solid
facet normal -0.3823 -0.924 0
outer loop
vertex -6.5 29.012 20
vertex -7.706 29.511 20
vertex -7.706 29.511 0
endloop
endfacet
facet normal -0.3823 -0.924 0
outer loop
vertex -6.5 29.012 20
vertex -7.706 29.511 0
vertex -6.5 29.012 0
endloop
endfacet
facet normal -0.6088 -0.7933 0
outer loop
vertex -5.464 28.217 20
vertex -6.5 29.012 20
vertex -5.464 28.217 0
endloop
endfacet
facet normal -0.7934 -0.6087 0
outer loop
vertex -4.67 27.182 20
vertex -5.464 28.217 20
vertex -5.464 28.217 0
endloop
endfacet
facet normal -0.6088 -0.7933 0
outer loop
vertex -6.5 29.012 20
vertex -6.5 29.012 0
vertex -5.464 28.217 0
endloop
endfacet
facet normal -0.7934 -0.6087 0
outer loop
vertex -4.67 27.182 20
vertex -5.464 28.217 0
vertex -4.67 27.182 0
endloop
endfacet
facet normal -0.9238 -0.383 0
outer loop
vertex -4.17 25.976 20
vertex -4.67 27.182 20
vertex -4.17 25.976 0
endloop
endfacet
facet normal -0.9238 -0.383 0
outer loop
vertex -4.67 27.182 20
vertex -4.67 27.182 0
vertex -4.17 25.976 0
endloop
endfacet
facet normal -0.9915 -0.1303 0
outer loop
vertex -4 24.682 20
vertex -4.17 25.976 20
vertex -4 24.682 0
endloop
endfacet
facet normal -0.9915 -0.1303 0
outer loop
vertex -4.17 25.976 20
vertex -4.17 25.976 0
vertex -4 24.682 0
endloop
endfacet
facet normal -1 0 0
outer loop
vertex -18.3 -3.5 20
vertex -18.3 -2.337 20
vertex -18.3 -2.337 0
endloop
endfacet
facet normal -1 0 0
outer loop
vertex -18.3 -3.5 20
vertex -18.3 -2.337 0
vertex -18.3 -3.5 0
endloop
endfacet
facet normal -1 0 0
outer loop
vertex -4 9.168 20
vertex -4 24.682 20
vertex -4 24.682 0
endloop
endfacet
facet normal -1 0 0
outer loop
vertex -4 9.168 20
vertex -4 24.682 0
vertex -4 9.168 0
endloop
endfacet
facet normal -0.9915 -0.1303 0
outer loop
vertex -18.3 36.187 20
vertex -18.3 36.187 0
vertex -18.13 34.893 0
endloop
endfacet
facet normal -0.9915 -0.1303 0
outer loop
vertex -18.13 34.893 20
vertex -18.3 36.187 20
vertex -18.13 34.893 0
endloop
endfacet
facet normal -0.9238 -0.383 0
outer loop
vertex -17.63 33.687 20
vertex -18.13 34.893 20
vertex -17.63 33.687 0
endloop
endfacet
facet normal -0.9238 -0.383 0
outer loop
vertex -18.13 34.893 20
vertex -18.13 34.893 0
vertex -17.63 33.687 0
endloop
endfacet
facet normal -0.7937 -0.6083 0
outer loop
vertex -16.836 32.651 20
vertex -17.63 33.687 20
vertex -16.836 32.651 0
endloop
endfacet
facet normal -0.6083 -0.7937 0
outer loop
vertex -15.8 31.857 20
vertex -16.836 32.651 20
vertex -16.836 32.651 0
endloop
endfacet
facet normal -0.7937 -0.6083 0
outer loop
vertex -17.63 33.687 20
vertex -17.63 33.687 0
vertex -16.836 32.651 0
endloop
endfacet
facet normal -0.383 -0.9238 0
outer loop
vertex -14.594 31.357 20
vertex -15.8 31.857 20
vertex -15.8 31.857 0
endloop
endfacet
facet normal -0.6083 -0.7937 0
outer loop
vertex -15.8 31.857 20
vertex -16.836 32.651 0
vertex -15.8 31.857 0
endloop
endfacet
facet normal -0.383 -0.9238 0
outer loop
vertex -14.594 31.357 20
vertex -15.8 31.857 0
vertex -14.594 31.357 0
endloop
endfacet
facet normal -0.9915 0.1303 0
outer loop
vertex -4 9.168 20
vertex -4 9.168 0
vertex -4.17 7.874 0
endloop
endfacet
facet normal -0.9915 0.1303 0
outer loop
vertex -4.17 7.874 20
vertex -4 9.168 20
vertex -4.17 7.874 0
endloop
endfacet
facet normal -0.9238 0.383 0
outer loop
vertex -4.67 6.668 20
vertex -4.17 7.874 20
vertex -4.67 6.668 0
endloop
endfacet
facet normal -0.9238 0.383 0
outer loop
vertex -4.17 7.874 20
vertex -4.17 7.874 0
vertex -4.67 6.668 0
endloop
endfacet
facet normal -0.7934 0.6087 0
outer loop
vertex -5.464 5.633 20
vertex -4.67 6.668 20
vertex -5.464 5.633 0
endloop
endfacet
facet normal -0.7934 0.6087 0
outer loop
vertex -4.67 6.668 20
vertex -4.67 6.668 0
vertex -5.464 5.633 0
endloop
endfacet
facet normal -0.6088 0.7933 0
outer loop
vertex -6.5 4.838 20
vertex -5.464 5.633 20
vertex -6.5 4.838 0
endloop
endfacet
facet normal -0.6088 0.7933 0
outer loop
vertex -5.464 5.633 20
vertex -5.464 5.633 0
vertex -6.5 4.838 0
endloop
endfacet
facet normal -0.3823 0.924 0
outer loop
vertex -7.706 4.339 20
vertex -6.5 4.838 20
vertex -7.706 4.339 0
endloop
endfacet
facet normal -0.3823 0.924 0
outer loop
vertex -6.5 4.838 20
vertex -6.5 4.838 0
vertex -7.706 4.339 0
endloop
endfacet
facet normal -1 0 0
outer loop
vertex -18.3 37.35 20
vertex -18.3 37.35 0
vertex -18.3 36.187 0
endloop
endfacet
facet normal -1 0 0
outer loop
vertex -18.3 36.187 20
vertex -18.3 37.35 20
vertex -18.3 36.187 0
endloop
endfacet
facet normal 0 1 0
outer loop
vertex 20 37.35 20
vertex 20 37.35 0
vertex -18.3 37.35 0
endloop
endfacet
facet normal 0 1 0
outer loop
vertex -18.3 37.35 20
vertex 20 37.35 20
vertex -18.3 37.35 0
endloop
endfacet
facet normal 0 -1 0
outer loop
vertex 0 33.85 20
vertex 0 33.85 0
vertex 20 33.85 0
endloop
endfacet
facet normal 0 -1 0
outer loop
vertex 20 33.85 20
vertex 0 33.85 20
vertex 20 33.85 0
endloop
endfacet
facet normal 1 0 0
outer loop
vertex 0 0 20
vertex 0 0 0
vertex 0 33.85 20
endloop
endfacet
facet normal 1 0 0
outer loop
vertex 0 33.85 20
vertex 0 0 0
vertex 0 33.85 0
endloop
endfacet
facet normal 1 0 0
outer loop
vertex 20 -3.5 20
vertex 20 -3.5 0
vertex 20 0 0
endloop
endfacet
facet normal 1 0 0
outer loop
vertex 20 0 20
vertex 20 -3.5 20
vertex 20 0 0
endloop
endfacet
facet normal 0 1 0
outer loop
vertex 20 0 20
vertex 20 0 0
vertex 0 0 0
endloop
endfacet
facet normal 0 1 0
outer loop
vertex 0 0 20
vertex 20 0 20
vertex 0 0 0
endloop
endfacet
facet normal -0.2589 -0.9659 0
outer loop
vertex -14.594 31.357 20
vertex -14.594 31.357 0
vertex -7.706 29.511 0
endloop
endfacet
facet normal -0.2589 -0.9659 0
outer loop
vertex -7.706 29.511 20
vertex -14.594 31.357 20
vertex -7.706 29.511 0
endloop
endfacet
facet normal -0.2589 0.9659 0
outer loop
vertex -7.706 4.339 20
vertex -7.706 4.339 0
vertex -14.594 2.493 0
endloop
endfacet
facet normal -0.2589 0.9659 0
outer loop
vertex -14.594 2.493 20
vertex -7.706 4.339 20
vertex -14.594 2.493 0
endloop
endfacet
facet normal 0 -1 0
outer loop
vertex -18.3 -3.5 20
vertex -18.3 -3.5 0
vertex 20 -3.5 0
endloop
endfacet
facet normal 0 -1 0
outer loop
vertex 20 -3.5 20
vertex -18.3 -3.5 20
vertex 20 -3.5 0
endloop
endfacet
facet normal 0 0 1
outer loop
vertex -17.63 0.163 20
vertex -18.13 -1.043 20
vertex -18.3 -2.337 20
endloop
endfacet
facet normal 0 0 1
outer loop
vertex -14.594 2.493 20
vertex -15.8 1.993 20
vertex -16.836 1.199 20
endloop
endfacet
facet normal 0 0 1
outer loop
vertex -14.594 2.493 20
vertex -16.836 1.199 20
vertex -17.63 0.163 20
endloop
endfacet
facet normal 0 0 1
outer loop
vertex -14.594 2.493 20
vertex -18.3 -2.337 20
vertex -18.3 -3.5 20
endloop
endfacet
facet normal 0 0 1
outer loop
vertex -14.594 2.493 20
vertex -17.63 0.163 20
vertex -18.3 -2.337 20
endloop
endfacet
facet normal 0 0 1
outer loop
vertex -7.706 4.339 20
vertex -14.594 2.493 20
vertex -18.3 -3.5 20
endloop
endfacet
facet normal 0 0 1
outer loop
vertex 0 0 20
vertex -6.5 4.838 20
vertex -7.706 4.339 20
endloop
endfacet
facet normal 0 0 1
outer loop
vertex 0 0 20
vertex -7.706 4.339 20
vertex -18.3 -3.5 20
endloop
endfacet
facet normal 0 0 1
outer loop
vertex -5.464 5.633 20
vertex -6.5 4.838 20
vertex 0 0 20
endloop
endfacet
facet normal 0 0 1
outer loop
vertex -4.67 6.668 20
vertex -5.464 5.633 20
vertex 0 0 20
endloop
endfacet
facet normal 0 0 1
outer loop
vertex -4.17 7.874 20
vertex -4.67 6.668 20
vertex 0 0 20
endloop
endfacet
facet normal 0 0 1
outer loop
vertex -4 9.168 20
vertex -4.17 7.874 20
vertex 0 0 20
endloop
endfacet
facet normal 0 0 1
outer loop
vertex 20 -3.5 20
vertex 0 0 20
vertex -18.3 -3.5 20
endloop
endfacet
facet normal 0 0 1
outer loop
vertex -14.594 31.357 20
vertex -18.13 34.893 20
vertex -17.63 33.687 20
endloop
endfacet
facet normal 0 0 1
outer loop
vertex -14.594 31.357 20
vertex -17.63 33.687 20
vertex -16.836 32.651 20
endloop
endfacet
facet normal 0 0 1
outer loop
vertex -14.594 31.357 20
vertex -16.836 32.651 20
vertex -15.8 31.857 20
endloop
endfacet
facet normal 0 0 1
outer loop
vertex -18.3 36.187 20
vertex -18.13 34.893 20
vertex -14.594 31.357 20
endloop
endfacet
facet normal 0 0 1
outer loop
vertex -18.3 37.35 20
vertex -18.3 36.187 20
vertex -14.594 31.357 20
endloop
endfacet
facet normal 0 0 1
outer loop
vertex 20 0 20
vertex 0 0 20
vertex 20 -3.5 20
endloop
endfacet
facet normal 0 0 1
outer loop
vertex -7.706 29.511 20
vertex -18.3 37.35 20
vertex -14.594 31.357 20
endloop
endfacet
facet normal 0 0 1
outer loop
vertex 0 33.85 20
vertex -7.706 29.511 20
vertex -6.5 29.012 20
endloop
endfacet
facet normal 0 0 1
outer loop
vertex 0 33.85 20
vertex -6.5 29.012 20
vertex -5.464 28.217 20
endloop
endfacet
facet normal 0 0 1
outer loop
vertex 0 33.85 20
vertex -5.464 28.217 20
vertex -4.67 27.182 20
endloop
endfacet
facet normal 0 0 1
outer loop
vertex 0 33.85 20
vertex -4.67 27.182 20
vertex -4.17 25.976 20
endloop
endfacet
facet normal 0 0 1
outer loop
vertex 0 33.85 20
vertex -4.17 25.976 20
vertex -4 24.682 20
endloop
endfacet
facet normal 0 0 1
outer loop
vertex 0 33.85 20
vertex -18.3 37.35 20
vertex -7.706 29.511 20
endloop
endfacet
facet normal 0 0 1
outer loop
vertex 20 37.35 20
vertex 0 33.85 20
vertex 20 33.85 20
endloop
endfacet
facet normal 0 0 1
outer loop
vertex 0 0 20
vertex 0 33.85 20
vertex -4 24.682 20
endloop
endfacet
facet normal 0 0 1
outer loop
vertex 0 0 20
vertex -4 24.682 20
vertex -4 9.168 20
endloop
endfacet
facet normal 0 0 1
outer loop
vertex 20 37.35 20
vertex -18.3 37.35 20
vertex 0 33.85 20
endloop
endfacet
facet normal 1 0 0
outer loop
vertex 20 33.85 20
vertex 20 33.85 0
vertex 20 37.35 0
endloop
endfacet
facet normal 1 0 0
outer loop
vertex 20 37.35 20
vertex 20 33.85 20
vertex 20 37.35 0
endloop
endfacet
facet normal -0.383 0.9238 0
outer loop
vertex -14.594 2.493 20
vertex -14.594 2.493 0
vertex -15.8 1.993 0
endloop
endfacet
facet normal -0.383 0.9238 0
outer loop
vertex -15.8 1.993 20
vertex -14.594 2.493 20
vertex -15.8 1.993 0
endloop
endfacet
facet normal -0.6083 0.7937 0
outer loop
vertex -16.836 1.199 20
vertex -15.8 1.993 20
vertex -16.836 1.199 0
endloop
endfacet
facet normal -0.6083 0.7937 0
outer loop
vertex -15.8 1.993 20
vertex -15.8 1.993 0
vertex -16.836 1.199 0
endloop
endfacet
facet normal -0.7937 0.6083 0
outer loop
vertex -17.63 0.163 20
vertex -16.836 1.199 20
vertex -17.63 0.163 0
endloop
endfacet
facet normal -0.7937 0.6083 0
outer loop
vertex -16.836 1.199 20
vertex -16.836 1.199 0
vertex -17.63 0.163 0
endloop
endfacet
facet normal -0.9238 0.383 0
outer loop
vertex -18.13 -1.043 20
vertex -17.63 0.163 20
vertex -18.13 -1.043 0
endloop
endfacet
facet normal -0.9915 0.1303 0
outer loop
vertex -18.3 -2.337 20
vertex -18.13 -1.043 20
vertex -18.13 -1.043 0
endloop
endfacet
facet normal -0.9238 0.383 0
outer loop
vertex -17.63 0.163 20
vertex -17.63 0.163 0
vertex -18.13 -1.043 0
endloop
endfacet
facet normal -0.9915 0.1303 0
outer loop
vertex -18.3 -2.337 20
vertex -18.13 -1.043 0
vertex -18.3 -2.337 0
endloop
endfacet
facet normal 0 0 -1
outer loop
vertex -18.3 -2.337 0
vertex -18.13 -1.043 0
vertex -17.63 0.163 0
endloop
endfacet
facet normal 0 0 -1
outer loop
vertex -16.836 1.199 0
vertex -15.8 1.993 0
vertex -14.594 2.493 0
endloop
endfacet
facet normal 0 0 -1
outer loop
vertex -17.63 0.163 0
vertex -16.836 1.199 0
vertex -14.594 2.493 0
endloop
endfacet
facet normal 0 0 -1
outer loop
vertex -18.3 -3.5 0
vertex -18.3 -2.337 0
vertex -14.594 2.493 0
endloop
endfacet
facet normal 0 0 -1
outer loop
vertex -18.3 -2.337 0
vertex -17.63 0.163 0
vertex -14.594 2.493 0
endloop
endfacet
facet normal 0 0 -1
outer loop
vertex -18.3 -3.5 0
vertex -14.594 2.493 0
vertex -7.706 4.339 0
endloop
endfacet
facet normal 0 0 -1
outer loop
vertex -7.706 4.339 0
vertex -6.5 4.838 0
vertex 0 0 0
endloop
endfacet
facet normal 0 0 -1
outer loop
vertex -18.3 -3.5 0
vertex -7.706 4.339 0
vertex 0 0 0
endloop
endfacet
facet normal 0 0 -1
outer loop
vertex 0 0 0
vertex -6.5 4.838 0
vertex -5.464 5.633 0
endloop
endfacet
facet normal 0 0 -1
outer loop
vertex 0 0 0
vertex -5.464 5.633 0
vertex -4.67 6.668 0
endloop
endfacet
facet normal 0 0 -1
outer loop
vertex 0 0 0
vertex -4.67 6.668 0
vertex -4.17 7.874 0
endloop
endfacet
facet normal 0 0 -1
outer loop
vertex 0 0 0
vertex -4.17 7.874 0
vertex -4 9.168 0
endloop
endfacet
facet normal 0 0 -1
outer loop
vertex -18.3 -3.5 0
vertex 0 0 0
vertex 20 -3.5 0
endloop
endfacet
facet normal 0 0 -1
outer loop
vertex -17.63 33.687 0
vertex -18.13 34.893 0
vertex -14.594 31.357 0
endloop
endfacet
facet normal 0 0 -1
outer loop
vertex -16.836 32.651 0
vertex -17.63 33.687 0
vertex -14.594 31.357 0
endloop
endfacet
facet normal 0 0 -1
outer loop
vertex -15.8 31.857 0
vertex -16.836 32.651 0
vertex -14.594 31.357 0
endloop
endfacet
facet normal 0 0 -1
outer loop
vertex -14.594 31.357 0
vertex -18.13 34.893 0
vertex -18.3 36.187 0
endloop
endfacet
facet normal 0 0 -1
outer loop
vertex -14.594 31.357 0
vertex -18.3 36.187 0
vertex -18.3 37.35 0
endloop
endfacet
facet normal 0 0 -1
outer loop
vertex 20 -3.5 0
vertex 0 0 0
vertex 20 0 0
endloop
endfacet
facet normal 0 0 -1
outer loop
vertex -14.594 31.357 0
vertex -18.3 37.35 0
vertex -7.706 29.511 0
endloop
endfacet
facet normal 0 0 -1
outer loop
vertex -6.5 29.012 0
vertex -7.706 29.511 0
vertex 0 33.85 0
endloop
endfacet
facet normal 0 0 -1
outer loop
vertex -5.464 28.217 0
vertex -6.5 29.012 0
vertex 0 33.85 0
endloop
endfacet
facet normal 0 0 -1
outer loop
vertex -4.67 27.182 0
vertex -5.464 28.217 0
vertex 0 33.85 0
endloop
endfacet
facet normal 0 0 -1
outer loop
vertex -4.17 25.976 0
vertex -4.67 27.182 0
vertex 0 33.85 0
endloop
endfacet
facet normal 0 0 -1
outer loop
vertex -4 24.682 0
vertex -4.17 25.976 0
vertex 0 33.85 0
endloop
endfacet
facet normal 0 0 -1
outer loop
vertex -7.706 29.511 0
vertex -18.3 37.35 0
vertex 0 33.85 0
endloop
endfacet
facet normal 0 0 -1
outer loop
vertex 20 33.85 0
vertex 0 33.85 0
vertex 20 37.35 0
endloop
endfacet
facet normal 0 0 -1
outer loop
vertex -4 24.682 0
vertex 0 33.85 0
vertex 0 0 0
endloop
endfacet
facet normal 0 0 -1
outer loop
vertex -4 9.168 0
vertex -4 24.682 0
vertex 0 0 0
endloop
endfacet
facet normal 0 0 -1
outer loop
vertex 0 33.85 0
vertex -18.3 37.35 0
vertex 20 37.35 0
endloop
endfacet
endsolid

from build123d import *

# Parameters (mm, degrees)
F1_DEPTH = 20


with BuildPart() as f1:
    # F0 (on Top) → F1 (new body)
    with BuildSketch(Plane.XY):
        with BuildLine():
            Line((20, -3.5), (20, 0))
            Line((20, 0), (0, 0))
            Line((0, 0), (0, 33.85))
            Line((0, 33.85), (20, 33.85))
            Line((20, 33.85), (20, 37.35))
            Line((20, 37.35), (-18.3, 37.35))
            Line((-18.3, 37.35), (-18.3, 36.186635))
            ThreePointArc((-18.3, 36.186635), (-17.266767, 33.142828), (-14.594095, 31.357006))
            Line((-14.594095, 31.357006), (-7.705905, 29.511321))
            ThreePointArc((-7.705905, 29.511321), (-5.033233, 27.725499), (-4, 24.681692))
            Line((-4, 24.681692), (-4, 16.925))
            Line((-4, 16.925), (-4, 9.168308))
            ThreePointArc((-4, 9.168308), (-5.033233, 6.124501), (-7.705905, 4.338679))
            Line((-7.705905, 4.338679), (-14.594095, 2.492994))
            ThreePointArc((-14.594095, 2.492994), (-17.266767, 0.707172), (-18.3, -2.336635))
            Line((-18.3, -2.336635), (-18.3, -3.5))
            Line((-18.3, -3.5), (20, -3.5))
        make_face()
    extrude(amount=F1_DEPTH)


solid = f1.part
